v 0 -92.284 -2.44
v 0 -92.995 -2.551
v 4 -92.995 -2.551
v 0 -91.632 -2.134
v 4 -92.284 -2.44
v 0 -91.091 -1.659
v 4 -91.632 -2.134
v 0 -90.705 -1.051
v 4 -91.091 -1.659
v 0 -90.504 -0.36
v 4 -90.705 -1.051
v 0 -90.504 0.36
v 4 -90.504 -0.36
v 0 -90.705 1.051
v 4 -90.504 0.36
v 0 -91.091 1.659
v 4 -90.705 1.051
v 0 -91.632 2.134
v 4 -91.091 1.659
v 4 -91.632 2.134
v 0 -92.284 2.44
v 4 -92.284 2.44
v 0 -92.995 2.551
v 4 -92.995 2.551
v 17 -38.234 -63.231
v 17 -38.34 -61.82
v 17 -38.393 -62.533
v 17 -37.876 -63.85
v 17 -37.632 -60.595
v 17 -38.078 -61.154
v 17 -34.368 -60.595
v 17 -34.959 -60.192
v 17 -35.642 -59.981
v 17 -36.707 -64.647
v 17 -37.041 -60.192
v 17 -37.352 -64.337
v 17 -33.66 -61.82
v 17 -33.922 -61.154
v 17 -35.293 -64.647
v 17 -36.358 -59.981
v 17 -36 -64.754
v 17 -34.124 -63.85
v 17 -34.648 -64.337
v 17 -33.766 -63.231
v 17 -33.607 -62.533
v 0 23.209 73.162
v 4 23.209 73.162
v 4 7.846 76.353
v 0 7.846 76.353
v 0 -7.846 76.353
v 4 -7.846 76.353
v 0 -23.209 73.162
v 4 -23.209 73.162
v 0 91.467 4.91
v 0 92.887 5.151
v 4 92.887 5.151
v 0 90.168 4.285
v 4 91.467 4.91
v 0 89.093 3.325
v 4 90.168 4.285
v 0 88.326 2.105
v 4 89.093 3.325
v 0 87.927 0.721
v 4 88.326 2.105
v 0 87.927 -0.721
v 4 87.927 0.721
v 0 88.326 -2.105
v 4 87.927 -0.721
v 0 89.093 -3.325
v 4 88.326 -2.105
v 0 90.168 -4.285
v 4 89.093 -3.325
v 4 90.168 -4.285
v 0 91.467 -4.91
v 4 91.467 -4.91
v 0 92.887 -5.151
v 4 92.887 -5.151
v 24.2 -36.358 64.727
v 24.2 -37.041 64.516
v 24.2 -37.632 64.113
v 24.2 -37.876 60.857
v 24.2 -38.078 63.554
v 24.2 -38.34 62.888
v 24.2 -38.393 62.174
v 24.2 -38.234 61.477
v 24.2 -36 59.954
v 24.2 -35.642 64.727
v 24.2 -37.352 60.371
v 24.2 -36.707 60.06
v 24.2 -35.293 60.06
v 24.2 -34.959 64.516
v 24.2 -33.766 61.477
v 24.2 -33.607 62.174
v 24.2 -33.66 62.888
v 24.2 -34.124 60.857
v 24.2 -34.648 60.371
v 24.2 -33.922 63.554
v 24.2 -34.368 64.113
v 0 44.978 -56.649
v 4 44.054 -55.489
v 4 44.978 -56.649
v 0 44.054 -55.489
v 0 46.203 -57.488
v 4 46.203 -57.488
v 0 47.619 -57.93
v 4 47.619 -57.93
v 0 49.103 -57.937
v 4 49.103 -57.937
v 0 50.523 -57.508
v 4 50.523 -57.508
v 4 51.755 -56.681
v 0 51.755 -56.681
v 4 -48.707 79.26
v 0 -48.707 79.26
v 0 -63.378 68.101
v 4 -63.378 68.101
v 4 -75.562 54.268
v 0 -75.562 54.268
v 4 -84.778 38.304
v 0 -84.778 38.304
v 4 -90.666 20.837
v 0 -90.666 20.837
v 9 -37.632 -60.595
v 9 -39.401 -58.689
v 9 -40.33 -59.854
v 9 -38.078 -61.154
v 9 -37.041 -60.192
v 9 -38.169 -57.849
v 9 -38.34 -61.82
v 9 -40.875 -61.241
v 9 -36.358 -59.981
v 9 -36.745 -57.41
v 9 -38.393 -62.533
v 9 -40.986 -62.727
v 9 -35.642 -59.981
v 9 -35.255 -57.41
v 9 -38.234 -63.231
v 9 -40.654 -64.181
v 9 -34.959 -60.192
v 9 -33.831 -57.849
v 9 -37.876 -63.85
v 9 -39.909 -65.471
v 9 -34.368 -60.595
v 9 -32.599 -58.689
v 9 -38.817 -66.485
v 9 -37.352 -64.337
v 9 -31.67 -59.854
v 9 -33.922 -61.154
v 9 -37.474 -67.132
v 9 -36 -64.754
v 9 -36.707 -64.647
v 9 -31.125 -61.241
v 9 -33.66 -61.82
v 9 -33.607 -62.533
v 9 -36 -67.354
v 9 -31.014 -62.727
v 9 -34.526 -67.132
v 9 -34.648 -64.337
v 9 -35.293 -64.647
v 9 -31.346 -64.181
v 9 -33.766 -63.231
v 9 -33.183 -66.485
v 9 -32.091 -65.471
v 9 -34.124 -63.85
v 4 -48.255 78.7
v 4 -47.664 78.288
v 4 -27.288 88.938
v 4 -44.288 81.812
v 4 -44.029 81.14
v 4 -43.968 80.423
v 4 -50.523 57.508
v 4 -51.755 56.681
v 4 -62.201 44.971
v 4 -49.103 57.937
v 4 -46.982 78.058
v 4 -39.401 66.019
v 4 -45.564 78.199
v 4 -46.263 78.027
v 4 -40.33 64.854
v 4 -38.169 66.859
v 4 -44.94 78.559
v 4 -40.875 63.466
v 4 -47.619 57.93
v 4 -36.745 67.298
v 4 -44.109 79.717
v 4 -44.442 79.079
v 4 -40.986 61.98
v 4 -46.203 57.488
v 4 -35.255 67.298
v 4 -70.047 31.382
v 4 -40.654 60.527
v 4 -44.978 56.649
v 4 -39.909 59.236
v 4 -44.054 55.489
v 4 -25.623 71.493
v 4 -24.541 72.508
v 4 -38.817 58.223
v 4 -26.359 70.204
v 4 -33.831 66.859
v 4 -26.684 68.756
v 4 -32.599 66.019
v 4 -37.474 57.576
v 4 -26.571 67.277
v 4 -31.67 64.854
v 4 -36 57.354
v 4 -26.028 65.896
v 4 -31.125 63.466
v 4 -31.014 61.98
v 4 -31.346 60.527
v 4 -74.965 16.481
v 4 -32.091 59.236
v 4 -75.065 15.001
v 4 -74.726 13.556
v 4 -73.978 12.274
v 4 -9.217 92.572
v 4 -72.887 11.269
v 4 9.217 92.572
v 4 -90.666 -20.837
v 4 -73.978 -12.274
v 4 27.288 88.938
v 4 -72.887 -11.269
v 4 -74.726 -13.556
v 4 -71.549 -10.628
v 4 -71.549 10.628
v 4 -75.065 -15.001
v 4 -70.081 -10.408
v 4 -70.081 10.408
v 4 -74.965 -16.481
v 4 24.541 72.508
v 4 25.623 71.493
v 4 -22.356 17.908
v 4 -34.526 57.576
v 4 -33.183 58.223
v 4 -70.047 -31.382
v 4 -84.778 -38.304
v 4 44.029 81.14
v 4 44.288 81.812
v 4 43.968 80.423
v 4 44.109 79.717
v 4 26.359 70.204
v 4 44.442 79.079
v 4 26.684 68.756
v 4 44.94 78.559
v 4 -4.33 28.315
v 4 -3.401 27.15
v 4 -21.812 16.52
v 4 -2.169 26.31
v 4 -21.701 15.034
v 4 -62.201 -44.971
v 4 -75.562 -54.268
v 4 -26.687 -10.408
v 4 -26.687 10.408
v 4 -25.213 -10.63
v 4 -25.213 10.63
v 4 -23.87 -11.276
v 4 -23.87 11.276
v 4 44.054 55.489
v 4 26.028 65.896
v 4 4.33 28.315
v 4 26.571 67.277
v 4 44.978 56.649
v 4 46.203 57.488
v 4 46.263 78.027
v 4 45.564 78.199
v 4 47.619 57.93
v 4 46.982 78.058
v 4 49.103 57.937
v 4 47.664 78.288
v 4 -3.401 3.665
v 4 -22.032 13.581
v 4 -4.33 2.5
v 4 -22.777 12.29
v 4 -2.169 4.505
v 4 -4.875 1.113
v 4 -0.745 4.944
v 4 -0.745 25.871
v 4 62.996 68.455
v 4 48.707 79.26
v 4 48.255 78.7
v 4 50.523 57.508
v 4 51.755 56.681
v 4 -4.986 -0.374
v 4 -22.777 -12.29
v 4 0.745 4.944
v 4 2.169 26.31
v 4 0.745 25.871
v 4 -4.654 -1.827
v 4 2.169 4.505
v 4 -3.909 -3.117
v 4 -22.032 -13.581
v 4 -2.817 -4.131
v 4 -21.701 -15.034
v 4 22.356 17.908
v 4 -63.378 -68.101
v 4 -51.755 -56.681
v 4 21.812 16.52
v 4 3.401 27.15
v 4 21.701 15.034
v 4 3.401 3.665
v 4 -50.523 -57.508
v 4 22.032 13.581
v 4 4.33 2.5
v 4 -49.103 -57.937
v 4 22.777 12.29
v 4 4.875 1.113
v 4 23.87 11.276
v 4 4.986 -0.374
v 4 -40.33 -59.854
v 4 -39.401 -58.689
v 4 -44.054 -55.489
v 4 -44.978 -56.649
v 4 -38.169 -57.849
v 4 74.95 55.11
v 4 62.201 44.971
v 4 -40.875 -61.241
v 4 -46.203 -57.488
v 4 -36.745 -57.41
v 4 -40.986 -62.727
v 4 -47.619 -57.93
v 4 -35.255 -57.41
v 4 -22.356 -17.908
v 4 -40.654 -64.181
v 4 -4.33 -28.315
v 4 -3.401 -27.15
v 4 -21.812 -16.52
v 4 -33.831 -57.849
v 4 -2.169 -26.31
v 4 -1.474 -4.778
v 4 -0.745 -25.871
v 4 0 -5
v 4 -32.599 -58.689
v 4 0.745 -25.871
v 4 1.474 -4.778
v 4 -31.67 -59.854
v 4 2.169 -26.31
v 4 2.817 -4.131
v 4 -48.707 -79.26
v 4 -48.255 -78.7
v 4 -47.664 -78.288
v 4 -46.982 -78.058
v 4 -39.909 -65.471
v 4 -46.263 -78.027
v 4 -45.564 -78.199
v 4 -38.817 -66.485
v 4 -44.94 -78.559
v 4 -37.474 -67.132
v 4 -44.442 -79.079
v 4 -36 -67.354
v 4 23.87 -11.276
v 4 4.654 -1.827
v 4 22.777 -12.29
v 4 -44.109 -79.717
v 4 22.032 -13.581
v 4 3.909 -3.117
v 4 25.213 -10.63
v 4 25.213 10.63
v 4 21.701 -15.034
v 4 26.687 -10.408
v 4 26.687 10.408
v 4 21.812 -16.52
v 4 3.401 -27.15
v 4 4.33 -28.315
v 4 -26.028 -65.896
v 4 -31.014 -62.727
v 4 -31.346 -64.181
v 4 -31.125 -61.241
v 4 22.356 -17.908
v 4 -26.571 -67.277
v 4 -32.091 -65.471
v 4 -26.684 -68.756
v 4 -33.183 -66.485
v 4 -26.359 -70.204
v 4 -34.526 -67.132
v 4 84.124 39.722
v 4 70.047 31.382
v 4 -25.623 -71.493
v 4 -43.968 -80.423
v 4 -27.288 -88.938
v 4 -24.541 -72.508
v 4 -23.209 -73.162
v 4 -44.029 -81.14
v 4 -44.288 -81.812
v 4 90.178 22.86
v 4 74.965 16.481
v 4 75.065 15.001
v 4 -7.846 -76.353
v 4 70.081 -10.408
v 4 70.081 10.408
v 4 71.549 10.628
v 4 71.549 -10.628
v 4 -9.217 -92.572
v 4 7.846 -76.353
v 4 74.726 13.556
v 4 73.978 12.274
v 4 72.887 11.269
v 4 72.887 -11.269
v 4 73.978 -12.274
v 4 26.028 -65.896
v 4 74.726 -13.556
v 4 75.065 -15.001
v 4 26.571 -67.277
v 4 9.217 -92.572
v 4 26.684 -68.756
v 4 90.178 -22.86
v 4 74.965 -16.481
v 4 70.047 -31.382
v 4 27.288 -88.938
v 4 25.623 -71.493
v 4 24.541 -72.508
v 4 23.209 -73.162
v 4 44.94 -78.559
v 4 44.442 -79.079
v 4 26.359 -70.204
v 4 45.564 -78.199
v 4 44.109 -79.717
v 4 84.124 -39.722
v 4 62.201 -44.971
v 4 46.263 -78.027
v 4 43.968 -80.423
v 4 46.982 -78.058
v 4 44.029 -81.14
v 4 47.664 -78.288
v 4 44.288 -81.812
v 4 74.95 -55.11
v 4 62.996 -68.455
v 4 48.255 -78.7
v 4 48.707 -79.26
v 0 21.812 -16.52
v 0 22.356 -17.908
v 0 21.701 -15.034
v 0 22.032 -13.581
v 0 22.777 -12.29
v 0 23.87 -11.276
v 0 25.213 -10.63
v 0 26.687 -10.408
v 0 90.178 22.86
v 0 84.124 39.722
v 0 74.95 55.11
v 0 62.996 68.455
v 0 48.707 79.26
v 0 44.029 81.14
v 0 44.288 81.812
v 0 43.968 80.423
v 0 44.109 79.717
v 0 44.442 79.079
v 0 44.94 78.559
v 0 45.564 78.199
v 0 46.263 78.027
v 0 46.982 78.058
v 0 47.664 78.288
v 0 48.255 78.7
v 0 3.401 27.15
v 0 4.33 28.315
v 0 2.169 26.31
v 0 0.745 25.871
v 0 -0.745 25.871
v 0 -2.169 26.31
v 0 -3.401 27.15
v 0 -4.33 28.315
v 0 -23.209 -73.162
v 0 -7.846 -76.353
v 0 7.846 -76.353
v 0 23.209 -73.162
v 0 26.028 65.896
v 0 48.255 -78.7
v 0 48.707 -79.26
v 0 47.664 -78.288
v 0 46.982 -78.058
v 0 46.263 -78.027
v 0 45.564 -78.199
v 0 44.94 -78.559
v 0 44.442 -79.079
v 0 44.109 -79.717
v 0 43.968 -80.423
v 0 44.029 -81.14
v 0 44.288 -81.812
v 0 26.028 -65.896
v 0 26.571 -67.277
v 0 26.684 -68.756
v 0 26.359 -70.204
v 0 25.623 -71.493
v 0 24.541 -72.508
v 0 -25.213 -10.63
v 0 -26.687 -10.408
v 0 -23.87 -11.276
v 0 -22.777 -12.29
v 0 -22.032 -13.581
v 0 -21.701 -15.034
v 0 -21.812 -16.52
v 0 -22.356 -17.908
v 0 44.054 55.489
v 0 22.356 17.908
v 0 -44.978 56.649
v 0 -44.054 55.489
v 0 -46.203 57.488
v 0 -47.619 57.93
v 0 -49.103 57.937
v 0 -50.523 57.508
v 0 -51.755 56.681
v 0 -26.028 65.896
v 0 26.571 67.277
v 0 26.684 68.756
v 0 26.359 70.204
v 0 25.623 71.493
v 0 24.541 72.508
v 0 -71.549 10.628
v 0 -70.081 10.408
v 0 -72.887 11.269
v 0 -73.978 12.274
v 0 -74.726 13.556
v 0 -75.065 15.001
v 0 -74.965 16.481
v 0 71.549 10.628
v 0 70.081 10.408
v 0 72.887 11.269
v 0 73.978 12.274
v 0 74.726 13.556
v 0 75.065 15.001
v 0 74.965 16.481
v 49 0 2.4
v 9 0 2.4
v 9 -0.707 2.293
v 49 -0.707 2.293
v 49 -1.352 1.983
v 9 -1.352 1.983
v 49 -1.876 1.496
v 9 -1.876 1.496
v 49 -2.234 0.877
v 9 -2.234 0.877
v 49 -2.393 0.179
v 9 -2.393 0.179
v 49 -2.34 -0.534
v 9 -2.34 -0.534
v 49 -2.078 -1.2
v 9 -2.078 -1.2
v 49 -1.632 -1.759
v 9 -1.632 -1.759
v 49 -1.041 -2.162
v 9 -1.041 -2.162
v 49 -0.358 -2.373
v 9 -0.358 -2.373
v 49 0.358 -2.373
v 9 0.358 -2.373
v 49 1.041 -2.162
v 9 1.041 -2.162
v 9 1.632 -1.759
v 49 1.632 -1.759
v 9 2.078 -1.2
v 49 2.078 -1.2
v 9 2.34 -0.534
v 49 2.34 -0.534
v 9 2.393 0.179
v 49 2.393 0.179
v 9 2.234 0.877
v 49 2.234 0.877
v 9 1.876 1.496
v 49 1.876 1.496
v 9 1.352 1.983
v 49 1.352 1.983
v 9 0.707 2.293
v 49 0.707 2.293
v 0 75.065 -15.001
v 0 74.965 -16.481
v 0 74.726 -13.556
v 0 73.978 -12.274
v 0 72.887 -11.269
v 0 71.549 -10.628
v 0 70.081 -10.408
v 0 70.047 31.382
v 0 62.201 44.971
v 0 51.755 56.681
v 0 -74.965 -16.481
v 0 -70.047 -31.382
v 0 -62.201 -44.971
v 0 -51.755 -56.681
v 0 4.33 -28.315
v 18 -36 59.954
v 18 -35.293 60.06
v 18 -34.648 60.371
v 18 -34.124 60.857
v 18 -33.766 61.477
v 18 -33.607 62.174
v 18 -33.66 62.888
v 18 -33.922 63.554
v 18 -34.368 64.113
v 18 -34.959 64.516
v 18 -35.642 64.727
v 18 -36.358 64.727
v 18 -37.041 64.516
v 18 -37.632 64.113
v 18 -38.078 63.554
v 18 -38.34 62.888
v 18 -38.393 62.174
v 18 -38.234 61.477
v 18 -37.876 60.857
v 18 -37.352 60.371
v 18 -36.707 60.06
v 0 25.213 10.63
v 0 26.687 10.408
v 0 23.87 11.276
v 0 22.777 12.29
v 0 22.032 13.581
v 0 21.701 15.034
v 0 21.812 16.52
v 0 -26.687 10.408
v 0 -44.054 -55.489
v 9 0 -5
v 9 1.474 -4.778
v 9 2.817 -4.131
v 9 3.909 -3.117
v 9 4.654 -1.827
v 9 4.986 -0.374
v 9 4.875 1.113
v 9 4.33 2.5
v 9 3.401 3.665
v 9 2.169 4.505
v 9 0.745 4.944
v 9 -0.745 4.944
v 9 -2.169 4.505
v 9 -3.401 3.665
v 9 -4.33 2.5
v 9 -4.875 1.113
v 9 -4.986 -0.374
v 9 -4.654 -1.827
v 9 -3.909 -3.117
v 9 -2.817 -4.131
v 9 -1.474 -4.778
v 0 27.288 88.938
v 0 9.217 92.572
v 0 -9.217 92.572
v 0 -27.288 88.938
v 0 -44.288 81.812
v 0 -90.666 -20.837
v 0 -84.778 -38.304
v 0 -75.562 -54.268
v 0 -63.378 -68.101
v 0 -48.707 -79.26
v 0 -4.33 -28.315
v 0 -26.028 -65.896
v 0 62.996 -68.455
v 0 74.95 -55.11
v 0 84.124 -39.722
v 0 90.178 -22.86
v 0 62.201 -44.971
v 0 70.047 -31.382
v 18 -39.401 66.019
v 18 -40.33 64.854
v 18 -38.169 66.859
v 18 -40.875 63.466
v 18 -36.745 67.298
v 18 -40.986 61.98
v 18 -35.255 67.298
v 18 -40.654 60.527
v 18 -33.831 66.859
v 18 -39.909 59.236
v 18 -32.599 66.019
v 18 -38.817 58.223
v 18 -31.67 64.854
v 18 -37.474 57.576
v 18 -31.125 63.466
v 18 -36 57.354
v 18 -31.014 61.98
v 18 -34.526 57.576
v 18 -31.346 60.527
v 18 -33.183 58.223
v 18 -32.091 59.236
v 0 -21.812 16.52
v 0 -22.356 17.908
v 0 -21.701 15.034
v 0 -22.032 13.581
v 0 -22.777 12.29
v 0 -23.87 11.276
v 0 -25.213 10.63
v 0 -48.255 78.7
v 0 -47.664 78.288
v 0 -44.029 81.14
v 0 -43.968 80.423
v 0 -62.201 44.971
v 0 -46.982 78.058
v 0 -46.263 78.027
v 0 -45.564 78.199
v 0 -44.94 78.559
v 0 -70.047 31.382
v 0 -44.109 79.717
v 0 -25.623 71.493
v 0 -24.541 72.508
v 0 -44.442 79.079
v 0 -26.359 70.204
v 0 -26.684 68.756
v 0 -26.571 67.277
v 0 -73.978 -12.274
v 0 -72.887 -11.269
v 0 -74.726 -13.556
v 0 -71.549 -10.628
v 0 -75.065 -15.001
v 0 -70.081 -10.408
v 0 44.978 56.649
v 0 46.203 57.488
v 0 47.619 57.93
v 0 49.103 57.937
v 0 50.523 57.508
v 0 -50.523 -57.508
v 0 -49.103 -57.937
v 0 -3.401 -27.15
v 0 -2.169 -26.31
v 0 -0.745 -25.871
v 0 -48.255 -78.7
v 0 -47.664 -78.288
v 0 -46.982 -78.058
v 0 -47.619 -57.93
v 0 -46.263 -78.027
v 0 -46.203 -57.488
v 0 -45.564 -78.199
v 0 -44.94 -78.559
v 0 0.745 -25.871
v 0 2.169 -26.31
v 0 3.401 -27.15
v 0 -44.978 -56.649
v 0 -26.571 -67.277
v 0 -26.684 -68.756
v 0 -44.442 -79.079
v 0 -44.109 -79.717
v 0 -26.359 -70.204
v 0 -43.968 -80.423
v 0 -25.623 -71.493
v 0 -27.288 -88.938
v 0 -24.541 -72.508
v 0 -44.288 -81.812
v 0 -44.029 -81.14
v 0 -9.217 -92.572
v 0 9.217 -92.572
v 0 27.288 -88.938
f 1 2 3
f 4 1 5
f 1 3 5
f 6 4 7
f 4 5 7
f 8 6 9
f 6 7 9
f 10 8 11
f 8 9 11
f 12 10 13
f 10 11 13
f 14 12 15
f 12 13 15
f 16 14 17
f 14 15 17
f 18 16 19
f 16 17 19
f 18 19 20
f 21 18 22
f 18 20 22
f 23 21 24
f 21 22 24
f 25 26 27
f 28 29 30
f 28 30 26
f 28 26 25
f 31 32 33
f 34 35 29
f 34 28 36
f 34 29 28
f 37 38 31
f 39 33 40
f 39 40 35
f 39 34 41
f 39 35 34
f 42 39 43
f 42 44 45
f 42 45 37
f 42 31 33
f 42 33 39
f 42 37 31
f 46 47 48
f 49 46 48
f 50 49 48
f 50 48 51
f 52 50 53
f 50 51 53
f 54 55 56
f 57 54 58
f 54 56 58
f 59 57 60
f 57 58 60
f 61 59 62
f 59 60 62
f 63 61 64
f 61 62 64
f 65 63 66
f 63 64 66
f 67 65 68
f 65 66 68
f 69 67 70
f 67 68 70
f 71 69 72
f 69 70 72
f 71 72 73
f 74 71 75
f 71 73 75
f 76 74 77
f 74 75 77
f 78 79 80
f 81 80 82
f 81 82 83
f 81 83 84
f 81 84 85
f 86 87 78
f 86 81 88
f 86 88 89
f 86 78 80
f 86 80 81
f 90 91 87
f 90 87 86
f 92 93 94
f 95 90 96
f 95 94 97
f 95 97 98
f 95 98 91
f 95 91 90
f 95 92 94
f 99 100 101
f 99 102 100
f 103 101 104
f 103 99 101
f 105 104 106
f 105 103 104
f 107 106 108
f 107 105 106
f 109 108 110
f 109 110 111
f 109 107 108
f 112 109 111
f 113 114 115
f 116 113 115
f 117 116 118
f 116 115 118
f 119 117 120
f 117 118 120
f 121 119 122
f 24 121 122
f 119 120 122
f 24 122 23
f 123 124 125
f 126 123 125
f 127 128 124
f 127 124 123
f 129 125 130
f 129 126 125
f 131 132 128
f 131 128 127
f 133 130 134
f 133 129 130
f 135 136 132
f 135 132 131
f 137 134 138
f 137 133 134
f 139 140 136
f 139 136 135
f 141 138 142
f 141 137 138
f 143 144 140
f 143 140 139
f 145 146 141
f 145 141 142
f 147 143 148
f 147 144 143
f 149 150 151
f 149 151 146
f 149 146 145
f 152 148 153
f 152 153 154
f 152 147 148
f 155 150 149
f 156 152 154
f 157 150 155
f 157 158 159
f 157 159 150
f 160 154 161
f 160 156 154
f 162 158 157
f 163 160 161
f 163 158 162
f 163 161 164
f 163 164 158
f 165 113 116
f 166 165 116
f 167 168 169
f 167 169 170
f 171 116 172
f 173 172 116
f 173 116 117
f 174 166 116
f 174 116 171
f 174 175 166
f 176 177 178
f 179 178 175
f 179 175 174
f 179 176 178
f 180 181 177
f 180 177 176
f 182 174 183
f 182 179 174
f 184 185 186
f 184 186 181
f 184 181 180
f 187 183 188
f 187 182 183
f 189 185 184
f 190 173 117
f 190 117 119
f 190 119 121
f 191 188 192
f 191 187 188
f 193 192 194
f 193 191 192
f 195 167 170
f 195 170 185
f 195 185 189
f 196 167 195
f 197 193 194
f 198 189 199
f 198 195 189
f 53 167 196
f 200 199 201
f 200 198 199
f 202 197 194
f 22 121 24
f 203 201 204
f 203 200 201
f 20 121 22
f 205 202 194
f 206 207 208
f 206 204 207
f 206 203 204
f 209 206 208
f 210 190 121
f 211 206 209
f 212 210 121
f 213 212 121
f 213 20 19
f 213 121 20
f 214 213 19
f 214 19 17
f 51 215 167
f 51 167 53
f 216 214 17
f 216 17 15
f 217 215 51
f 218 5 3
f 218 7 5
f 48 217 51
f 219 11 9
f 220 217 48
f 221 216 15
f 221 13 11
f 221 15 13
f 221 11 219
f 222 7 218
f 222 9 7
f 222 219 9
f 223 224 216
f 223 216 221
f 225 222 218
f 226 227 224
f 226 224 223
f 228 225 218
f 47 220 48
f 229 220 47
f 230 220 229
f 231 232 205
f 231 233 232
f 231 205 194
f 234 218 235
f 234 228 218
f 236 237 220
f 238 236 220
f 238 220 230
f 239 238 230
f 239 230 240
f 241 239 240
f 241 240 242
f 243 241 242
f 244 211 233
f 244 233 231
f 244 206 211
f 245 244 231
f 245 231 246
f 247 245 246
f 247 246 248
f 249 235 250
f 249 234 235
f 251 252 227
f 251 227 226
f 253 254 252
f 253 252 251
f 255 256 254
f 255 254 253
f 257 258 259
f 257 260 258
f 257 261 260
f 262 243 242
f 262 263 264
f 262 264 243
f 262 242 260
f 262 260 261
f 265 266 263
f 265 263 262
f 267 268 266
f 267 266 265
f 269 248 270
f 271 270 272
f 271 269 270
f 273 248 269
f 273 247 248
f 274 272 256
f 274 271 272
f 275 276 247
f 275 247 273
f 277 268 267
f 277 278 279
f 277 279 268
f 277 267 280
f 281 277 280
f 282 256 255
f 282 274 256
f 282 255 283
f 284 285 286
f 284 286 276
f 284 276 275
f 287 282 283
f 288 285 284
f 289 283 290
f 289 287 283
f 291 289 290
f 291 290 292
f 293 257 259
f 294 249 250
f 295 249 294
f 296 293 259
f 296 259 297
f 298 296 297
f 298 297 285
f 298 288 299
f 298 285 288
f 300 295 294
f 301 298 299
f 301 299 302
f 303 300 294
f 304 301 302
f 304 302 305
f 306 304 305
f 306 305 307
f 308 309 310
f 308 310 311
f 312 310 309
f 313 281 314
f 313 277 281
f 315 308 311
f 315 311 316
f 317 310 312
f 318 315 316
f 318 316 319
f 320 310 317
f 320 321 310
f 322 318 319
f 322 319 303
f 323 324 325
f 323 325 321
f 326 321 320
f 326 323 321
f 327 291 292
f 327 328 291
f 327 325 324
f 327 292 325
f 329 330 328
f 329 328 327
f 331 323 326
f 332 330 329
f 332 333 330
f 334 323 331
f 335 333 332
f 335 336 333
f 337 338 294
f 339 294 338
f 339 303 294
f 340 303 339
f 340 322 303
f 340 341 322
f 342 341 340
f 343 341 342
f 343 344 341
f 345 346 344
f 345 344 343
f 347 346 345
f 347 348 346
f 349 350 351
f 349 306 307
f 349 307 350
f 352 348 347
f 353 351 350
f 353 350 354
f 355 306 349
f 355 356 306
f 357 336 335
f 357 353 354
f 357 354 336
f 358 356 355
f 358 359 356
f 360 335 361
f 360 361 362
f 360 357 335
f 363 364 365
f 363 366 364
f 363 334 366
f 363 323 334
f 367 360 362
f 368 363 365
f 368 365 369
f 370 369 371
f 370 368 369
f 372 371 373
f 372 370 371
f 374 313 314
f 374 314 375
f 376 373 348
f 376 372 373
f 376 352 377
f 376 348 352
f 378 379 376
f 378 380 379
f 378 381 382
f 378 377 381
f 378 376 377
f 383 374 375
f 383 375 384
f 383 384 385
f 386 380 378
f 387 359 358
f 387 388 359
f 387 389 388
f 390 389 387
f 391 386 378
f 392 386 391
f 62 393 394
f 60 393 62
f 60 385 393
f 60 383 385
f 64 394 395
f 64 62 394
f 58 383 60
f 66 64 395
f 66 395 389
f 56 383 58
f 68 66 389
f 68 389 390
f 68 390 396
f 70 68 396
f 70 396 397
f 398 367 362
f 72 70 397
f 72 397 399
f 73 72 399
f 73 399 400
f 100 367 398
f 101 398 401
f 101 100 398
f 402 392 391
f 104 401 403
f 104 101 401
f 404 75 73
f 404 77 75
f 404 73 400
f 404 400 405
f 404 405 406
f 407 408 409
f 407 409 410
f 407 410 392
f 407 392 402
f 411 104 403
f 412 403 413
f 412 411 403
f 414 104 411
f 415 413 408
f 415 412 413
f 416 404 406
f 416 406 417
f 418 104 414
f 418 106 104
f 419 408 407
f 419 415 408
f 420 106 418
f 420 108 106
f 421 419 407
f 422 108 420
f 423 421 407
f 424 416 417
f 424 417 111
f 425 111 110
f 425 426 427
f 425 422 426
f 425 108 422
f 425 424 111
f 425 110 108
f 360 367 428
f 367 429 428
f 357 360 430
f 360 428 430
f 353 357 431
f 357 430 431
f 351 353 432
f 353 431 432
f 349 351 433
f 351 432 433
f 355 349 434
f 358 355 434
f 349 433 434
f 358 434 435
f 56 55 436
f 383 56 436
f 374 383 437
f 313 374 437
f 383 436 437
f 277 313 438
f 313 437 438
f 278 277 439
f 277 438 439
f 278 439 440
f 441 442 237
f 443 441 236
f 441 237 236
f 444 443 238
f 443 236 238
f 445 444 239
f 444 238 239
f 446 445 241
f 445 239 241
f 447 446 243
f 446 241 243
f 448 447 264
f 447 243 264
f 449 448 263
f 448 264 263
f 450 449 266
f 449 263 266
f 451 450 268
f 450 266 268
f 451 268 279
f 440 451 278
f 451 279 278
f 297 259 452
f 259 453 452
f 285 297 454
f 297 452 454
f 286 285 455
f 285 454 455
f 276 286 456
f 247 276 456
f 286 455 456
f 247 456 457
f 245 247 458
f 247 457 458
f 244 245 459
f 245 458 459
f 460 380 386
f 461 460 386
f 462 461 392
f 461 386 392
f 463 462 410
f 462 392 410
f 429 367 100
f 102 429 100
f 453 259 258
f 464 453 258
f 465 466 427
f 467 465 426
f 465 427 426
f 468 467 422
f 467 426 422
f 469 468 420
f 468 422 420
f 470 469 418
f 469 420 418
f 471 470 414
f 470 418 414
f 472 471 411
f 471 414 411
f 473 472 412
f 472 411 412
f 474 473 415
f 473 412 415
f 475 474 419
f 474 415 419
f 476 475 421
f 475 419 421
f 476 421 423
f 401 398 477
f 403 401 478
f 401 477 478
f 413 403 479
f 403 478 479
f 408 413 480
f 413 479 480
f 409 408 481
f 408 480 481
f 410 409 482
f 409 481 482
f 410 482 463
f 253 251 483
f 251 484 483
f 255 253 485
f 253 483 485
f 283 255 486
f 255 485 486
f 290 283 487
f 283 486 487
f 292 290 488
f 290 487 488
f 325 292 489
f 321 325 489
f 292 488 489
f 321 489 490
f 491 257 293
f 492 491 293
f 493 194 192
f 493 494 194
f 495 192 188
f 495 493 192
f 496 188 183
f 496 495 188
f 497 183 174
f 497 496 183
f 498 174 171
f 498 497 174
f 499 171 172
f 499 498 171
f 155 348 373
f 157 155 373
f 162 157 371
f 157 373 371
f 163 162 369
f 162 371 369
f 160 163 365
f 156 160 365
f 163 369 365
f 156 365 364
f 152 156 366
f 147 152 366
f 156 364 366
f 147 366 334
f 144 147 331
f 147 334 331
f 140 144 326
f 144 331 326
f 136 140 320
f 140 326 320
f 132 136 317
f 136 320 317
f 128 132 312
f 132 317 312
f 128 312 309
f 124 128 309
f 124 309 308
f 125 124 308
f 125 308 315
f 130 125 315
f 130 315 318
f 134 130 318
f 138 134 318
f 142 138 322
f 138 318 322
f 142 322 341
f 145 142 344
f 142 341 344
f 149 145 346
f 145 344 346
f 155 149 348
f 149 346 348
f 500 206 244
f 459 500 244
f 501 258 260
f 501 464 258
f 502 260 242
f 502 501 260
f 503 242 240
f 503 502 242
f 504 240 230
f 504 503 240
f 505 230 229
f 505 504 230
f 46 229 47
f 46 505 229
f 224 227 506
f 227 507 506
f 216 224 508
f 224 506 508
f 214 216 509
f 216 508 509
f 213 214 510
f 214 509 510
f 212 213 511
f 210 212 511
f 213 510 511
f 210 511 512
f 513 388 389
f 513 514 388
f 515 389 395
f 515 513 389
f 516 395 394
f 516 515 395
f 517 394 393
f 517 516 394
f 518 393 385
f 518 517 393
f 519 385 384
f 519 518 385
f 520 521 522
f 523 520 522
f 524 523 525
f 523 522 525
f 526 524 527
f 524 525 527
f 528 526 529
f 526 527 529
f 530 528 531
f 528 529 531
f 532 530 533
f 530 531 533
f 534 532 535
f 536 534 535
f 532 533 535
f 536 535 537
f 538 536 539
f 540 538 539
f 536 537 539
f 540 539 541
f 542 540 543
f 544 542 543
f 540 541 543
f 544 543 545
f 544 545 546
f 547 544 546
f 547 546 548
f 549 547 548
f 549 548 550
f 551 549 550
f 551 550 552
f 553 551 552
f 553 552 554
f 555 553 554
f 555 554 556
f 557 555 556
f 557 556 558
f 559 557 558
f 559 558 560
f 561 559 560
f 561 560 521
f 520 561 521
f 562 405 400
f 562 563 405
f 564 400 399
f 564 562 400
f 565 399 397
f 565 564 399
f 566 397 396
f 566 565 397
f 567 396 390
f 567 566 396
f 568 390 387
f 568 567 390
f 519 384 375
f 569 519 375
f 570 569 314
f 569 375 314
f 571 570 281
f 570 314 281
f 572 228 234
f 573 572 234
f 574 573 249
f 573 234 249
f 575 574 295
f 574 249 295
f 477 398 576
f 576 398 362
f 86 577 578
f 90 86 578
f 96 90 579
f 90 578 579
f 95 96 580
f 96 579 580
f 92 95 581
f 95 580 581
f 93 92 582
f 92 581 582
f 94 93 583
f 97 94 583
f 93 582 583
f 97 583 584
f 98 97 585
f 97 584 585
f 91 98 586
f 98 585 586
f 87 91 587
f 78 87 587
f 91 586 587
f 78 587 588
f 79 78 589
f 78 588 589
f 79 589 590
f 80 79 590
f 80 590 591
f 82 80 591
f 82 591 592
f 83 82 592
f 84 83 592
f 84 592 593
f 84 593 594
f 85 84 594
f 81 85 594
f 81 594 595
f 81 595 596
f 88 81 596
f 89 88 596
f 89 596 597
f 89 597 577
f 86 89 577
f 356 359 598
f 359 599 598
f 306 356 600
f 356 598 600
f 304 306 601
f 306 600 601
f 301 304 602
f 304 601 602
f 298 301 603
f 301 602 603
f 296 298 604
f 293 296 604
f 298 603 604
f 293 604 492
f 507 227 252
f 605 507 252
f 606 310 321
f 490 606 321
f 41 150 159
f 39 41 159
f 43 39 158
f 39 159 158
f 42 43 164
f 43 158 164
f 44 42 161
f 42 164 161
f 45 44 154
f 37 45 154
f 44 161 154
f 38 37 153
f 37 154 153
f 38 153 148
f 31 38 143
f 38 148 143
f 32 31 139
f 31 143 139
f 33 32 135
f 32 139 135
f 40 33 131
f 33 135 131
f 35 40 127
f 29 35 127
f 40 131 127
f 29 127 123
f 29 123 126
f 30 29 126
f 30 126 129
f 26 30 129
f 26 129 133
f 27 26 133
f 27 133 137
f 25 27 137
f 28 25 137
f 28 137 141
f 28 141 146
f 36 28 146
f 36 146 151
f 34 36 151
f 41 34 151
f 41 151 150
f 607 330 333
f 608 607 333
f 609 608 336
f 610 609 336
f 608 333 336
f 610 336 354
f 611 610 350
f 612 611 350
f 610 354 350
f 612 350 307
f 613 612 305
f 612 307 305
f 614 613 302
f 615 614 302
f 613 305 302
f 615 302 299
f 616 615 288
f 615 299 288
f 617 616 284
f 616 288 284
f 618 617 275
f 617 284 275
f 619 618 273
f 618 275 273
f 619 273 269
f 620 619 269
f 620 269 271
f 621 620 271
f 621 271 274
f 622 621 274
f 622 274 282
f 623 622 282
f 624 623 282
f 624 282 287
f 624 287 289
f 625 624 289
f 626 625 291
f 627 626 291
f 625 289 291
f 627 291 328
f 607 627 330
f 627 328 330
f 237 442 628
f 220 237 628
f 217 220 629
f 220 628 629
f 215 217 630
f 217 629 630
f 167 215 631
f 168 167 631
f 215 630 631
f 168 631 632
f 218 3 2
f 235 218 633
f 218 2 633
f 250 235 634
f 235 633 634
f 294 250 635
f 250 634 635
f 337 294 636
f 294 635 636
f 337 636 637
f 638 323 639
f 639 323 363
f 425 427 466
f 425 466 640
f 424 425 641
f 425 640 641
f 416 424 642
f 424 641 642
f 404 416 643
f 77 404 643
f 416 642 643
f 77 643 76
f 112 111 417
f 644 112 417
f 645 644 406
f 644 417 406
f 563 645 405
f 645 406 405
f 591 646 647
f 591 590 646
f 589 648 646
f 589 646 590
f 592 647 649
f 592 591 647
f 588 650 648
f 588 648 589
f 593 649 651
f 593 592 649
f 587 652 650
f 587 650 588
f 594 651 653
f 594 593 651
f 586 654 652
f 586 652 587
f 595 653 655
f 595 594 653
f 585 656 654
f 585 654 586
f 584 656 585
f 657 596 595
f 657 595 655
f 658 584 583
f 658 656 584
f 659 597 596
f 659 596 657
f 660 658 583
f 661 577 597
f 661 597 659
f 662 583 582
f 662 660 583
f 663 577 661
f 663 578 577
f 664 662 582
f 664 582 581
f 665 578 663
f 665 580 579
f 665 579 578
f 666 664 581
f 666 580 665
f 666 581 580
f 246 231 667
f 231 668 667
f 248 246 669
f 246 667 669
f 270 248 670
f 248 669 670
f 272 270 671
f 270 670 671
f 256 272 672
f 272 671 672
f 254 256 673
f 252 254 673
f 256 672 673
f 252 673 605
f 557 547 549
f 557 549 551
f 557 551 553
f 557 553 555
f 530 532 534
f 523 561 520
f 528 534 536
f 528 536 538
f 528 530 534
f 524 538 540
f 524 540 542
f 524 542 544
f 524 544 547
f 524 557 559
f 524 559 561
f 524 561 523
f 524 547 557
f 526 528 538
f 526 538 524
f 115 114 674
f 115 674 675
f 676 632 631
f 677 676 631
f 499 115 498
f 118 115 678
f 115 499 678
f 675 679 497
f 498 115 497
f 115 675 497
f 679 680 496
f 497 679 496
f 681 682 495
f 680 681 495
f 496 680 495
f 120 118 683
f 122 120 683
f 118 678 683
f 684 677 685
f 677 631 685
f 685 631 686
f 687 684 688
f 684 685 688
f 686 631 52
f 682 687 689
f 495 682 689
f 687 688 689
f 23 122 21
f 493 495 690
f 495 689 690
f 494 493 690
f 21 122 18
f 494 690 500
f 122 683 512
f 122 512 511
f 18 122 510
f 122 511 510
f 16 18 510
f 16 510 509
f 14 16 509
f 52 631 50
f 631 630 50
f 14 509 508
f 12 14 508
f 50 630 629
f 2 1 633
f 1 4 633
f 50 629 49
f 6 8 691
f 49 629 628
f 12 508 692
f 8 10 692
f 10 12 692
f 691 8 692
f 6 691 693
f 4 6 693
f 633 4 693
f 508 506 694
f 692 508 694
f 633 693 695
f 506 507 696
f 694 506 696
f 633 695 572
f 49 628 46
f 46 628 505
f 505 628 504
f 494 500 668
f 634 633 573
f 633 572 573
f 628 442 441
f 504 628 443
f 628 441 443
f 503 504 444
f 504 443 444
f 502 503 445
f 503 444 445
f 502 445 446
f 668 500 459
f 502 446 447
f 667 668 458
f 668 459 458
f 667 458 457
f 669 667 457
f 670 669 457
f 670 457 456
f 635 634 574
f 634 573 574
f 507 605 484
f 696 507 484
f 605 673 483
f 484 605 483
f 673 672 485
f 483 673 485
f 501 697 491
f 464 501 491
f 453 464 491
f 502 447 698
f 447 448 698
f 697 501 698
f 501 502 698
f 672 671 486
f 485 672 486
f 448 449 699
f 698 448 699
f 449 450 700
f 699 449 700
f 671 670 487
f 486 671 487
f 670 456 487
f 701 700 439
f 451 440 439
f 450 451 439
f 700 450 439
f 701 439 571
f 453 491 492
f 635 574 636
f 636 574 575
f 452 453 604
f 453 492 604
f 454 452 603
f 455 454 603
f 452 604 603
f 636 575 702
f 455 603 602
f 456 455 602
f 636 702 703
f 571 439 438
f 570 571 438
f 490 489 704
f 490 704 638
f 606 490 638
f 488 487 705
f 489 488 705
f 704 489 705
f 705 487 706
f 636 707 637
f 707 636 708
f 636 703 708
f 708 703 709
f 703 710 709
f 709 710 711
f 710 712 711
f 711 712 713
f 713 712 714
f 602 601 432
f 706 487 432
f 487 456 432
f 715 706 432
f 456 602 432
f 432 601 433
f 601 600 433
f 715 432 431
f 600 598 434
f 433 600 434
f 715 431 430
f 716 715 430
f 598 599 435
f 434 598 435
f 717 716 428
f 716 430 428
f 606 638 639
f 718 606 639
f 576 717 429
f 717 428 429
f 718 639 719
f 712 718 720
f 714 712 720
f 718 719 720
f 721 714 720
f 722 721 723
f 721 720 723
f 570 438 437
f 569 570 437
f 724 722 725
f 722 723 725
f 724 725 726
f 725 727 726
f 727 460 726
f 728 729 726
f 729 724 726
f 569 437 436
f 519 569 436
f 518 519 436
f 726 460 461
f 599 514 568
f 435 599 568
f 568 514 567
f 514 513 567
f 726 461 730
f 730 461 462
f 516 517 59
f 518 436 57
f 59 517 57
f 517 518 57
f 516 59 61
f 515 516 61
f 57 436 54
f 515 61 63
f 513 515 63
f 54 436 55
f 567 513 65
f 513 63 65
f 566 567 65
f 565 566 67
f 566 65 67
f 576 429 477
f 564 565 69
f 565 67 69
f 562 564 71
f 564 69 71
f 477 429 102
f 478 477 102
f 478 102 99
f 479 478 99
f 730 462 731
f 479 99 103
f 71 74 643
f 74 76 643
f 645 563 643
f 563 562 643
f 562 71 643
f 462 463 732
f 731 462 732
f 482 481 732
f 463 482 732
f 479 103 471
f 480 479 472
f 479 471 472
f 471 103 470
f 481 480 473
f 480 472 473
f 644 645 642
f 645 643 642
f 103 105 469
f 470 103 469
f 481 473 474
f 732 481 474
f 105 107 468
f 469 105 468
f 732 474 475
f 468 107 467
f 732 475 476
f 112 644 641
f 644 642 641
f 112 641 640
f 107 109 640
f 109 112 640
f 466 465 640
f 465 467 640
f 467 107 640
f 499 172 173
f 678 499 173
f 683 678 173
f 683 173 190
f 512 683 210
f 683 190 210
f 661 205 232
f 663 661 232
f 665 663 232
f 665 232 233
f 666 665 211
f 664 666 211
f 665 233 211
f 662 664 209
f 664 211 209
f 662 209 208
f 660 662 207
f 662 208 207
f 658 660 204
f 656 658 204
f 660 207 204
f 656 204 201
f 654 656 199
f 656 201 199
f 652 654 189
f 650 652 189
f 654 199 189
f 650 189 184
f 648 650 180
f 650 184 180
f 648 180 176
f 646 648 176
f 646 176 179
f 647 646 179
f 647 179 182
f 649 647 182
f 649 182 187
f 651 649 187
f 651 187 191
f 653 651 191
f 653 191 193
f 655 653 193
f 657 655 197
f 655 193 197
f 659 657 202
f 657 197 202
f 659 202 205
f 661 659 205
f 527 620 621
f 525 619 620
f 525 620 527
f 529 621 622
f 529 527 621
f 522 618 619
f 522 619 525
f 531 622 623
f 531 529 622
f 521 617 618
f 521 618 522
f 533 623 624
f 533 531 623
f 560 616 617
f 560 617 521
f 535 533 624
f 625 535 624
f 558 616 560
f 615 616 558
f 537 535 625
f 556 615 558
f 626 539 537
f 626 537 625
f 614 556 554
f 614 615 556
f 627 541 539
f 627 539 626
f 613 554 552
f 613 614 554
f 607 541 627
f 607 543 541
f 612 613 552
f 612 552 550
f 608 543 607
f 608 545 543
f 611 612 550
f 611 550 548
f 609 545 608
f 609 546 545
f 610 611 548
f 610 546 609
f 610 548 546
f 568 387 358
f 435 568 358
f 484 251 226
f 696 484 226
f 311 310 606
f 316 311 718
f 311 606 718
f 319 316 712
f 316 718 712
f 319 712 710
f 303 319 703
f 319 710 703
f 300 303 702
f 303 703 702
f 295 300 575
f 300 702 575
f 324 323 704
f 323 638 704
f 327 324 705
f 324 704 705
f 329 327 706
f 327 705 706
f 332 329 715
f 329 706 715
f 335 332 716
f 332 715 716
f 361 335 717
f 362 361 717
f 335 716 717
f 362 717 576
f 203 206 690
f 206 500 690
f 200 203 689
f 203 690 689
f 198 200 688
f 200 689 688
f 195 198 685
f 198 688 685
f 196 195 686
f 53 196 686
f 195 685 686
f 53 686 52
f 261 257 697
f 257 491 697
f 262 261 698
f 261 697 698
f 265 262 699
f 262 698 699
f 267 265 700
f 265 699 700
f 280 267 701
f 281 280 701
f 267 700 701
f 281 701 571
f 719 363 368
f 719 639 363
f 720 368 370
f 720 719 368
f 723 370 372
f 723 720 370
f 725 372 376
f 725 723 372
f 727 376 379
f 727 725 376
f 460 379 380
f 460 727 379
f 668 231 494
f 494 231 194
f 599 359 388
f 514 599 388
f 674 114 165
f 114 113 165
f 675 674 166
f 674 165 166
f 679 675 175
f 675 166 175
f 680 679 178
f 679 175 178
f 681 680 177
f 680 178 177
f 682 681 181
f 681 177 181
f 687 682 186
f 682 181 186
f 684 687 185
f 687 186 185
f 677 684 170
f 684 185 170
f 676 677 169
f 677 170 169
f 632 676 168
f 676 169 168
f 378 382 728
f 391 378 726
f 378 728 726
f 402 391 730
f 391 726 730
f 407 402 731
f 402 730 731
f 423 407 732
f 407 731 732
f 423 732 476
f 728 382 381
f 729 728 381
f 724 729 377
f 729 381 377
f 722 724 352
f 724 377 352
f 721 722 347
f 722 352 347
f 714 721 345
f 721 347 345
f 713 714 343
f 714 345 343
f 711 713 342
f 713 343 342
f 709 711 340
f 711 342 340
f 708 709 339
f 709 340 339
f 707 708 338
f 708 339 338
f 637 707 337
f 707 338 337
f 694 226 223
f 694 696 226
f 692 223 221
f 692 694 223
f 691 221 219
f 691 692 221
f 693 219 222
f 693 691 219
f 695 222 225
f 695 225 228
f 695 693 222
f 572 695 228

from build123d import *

# Parameters (mm, degrees)
SKETCH_1_R               = 93.03002178900209
EXTRUDE_1_DEPTH          = 4
SKETCH_2_R               = 2.4
EXTRUDE_2_DEPTH          = 45
SKETCH_3_R               = 5
EXTRUDE_3_DEPTH          = 5
SKETCH_4_R               = 2.3999999999999937
EXTRUDE_4_DEPTH          = 12.999999999999998
SKETCH_5_R               = 4.9999999999999964
EXTRUDE_5_DEPTH          = 4.999999999999997
SKETCH_6_R               = 2.3999999999999932
EXTRUDE_6_DEPTH          = 20.200000000000017
SKETCH_7_R               = 4.9999999999999964
EXTRUDE_7_DEPTH          = 14
CUT_EXTRUDE_1_REACH      = 141.047
SKETCH_8_R               = 5.153202095824808
SKETCH_9_R               = 2.5515156643505628
SKETCH_9_R_2             = 2.551515664350585
SKETCH_9_R_3             = 2.551515664350554
SKETCH_9_R_4             = 2.5515156643508896
CUT_EXTRUDE_3_DEPTH      = 5.9999999999999964
CUT_EXTRUDE_4_REACH      = 141.024
PATTERN_CIRCULAR_1_COUNT = 6
FILLET_1_R               = 5


with BuildPart() as part:
    # 草图1 → 凸台-拉伸1 (new body)
    with BuildSketch(Plane(origin=(0, 0, 0), x_dir=(0, 0, -1), z_dir=(1, 0, 0))):
        Circle(SKETCH_1_R)
    extrude(amount=EXTRUDE_1_DEPTH)

    # 草图2 → 凸台-拉伸2 (add)
    with BuildSketch(Plane(origin=(4, 0, 0), x_dir=(0, 0, -1), z_dir=(1, 0, 0))):
        with Locations(Location((0, 0, 0), (0, 0, 180))):
            Circle(SKETCH_2_R)
    extrude(amount=EXTRUDE_2_DEPTH)

    # 草图3 → 凸台-拉伸3 (add)
    with BuildSketch(Plane(origin=(4, 0, 0), x_dir=(0, 0, -1), z_dir=(1, 0, 0))):
        Circle(SKETCH_3_R)
    extrude(amount=EXTRUDE_3_DEPTH)

    # 草图4 → 凸台-拉伸4 (add)
    with BuildSketch(Plane(origin=(4, 0, 0), x_dir=(0, 0, -1), z_dir=(1, 0, 0))):
        with Locations((62.35382907247964, -35.9999999999998)):
            Circle(SKETCH_4_R)
    extrude(amount=EXTRUDE_4_DEPTH)

    # 草图5 → 凸台-拉伸5 (add)
    with BuildSketch(Plane(origin=(4, 0, 0), x_dir=(0, 0, -1), z_dir=(1, 0, 0))):
        with Locations((62.35382907247964, -35.9999999999998)):
            Circle(SKETCH_5_R)
    extrude(amount=EXTRUDE_5_DEPTH)

    # 草图6 → 凸台-拉伸6 (add)
    with BuildSketch(Plane(origin=(4, 0, 0), x_dir=(0, 0, -1), z_dir=(1, 0, 0))):
        with Locations((-62.35382907247939, -36.00000000000031)):
            Circle(SKETCH_6_R)
    extrude(amount=EXTRUDE_6_DEPTH)

    # 草图7 → 凸台-拉伸7 (add)
    with BuildSketch(Plane(origin=(4, 0, 0), x_dir=(0, 0, -1), z_dir=(1, 0, 0))):
        with Locations((-62.35382907247939, -36.00000000000031)):
            Circle(SKETCH_7_R)
    extrude(amount=EXTRUDE_7_DEPTH)

    # 草图8 → 切除-拉伸1 (cut, up to next)
    with BuildSketch(Plane(origin=(4, 0, 0), x_dir=(0, 0, -1), z_dir=(1, 0, 0)), mode=Mode.PRIVATE) as cut_extrude_1_sk1:
        with Locations((0, 93.03002178900209)):
            Circle(SKETCH_8_R)
    cut_extrude_1_tool1 = extrude(cut_extrude_1_sk1.sketch, amount=-CUT_EXTRUDE_1_REACH, mode=Mode.PRIVATE) & part.part
    add(cut_extrude_1_tool1.solids().sort_by_distance((4, 93.030022, 0))[0], mode=Mode.SUBTRACT)

    # 草图9 → 切除-拉伸3 (cut)
    with BuildSketch(Plane(origin=(4, 0, 0), x_dir=(0, 0, -1), z_dir=(1, 0, 0))):
        with Locations((3.47e-15, 93.03002178900209)):
            Circle(SKETCH_9_R)
        with Locations((80.56636218389566, 46.515010894501074)):
            Circle(SKETCH_9_R_2)
        with Locations((80.56636218389568, -46.51501089450103)):
            Circle(SKETCH_9_R_3)
        with Locations((8.67e-15, -93.03002178900209)):
            Circle(SKETCH_9_R)
        with Locations((-80.56636218389565, -46.51501089450109)):
            Circle(SKETCH_9_R_3)
        with Locations((-80.56636218389569, 46.51501089450098)):
            Circle(SKETCH_9_R_4)
    extrude(amount=-CUT_EXTRUDE_3_DEPTH, mode=Mode.SUBTRACT)

    # 草图10 → 切除-拉伸4 (cut, up to next)
    with BuildSketch(Plane(origin=(4, 0, 0), x_dir=(0, 0, -1), z_dir=(1, 0, 0)), mode=Mode.PRIVATE) as cut_extrude_4_sk1:
        with BuildLine():
            Line((-10.407514658464736, 18.02634416897966), (-10.407514658464395, 76.04625246317465))
            ThreePointArc((-10.407514658464395, 76.04625246317465), (-38.37756139679427, 66.47188620984315), (-60.65422916648111, 47.03629831607756))
            Line((-60.65422916648111, 47.03629831607756), (-10.407514658464736, 18.02634416897966))
        make_face()
    cut_extrude_4_tool1 = extrude(cut_extrude_4_sk1.sketch, amount=-CUT_EXTRUDE_4_REACH, mode=Mode.PRIVATE) & part.part
    cut_extrude_4 = cut_extrude_4_tool1.solids().sort_by_distance((4, 49.214145, 28.4138))[0]
    add(cut_extrude_4, mode=Mode.SUBTRACT)

    # 阵列(圆周)1: 切除-拉伸4 ×6 about axis
    pattern_circular_1_axis = Axis((0, -1e-16, -8.9e-16), (1, 0, 0))
    for i in range(1, PATTERN_CIRCULAR_1_COUNT):
        add(cut_extrude_4.rotate(pattern_circular_1_axis, i * 360 / PATTERN_CIRCULAR_1_COUNT), mode=Mode.SUBTRACT)

    # 圆角1
    fillet_1_edges = [part.edges().sort_by_distance(p)[0] for p in [
        (2, 18.02634416897966, 10.407514658464736),
        (2, 47.03629831607757, 60.65422916648111),
        (2, 76.04625246317465, 10.407514658464397),
        (2, -18.026344168979215, 10.407514658465503),
        (2, -76.04625246317445, 10.407514658465852),
        (2, -47.036298316076405, 60.654229166482004),
        (2, 4.4326e-13, 20.815029316930236),
        (2, -29.009954147096884, 71.06174382494694),
        (2, 29.00995414709824, 71.06174382494639),
        (2, -4.5413e-13, -20.815029316930236),
        (2, 29.009954147096852, -71.06174382494696),
        (2, -29.00995414709827, -71.06174382494638),
        (2, -18.02634416897966, -10.407514658464736),
        (2, -47.03629831607758, -60.6542291664811),
        (2, -76.04625246317465, -10.40751465846439),
        (2, 18.026344168979218, -10.4075146584655),
        (2, 76.04625246317445, -10.407514658465825),
        (2, 47.036298316076426, -60.65422916648199),
    ]]
    fillet(fillet_1_edges, radius=FILLET_1_R)


solid = part.part
